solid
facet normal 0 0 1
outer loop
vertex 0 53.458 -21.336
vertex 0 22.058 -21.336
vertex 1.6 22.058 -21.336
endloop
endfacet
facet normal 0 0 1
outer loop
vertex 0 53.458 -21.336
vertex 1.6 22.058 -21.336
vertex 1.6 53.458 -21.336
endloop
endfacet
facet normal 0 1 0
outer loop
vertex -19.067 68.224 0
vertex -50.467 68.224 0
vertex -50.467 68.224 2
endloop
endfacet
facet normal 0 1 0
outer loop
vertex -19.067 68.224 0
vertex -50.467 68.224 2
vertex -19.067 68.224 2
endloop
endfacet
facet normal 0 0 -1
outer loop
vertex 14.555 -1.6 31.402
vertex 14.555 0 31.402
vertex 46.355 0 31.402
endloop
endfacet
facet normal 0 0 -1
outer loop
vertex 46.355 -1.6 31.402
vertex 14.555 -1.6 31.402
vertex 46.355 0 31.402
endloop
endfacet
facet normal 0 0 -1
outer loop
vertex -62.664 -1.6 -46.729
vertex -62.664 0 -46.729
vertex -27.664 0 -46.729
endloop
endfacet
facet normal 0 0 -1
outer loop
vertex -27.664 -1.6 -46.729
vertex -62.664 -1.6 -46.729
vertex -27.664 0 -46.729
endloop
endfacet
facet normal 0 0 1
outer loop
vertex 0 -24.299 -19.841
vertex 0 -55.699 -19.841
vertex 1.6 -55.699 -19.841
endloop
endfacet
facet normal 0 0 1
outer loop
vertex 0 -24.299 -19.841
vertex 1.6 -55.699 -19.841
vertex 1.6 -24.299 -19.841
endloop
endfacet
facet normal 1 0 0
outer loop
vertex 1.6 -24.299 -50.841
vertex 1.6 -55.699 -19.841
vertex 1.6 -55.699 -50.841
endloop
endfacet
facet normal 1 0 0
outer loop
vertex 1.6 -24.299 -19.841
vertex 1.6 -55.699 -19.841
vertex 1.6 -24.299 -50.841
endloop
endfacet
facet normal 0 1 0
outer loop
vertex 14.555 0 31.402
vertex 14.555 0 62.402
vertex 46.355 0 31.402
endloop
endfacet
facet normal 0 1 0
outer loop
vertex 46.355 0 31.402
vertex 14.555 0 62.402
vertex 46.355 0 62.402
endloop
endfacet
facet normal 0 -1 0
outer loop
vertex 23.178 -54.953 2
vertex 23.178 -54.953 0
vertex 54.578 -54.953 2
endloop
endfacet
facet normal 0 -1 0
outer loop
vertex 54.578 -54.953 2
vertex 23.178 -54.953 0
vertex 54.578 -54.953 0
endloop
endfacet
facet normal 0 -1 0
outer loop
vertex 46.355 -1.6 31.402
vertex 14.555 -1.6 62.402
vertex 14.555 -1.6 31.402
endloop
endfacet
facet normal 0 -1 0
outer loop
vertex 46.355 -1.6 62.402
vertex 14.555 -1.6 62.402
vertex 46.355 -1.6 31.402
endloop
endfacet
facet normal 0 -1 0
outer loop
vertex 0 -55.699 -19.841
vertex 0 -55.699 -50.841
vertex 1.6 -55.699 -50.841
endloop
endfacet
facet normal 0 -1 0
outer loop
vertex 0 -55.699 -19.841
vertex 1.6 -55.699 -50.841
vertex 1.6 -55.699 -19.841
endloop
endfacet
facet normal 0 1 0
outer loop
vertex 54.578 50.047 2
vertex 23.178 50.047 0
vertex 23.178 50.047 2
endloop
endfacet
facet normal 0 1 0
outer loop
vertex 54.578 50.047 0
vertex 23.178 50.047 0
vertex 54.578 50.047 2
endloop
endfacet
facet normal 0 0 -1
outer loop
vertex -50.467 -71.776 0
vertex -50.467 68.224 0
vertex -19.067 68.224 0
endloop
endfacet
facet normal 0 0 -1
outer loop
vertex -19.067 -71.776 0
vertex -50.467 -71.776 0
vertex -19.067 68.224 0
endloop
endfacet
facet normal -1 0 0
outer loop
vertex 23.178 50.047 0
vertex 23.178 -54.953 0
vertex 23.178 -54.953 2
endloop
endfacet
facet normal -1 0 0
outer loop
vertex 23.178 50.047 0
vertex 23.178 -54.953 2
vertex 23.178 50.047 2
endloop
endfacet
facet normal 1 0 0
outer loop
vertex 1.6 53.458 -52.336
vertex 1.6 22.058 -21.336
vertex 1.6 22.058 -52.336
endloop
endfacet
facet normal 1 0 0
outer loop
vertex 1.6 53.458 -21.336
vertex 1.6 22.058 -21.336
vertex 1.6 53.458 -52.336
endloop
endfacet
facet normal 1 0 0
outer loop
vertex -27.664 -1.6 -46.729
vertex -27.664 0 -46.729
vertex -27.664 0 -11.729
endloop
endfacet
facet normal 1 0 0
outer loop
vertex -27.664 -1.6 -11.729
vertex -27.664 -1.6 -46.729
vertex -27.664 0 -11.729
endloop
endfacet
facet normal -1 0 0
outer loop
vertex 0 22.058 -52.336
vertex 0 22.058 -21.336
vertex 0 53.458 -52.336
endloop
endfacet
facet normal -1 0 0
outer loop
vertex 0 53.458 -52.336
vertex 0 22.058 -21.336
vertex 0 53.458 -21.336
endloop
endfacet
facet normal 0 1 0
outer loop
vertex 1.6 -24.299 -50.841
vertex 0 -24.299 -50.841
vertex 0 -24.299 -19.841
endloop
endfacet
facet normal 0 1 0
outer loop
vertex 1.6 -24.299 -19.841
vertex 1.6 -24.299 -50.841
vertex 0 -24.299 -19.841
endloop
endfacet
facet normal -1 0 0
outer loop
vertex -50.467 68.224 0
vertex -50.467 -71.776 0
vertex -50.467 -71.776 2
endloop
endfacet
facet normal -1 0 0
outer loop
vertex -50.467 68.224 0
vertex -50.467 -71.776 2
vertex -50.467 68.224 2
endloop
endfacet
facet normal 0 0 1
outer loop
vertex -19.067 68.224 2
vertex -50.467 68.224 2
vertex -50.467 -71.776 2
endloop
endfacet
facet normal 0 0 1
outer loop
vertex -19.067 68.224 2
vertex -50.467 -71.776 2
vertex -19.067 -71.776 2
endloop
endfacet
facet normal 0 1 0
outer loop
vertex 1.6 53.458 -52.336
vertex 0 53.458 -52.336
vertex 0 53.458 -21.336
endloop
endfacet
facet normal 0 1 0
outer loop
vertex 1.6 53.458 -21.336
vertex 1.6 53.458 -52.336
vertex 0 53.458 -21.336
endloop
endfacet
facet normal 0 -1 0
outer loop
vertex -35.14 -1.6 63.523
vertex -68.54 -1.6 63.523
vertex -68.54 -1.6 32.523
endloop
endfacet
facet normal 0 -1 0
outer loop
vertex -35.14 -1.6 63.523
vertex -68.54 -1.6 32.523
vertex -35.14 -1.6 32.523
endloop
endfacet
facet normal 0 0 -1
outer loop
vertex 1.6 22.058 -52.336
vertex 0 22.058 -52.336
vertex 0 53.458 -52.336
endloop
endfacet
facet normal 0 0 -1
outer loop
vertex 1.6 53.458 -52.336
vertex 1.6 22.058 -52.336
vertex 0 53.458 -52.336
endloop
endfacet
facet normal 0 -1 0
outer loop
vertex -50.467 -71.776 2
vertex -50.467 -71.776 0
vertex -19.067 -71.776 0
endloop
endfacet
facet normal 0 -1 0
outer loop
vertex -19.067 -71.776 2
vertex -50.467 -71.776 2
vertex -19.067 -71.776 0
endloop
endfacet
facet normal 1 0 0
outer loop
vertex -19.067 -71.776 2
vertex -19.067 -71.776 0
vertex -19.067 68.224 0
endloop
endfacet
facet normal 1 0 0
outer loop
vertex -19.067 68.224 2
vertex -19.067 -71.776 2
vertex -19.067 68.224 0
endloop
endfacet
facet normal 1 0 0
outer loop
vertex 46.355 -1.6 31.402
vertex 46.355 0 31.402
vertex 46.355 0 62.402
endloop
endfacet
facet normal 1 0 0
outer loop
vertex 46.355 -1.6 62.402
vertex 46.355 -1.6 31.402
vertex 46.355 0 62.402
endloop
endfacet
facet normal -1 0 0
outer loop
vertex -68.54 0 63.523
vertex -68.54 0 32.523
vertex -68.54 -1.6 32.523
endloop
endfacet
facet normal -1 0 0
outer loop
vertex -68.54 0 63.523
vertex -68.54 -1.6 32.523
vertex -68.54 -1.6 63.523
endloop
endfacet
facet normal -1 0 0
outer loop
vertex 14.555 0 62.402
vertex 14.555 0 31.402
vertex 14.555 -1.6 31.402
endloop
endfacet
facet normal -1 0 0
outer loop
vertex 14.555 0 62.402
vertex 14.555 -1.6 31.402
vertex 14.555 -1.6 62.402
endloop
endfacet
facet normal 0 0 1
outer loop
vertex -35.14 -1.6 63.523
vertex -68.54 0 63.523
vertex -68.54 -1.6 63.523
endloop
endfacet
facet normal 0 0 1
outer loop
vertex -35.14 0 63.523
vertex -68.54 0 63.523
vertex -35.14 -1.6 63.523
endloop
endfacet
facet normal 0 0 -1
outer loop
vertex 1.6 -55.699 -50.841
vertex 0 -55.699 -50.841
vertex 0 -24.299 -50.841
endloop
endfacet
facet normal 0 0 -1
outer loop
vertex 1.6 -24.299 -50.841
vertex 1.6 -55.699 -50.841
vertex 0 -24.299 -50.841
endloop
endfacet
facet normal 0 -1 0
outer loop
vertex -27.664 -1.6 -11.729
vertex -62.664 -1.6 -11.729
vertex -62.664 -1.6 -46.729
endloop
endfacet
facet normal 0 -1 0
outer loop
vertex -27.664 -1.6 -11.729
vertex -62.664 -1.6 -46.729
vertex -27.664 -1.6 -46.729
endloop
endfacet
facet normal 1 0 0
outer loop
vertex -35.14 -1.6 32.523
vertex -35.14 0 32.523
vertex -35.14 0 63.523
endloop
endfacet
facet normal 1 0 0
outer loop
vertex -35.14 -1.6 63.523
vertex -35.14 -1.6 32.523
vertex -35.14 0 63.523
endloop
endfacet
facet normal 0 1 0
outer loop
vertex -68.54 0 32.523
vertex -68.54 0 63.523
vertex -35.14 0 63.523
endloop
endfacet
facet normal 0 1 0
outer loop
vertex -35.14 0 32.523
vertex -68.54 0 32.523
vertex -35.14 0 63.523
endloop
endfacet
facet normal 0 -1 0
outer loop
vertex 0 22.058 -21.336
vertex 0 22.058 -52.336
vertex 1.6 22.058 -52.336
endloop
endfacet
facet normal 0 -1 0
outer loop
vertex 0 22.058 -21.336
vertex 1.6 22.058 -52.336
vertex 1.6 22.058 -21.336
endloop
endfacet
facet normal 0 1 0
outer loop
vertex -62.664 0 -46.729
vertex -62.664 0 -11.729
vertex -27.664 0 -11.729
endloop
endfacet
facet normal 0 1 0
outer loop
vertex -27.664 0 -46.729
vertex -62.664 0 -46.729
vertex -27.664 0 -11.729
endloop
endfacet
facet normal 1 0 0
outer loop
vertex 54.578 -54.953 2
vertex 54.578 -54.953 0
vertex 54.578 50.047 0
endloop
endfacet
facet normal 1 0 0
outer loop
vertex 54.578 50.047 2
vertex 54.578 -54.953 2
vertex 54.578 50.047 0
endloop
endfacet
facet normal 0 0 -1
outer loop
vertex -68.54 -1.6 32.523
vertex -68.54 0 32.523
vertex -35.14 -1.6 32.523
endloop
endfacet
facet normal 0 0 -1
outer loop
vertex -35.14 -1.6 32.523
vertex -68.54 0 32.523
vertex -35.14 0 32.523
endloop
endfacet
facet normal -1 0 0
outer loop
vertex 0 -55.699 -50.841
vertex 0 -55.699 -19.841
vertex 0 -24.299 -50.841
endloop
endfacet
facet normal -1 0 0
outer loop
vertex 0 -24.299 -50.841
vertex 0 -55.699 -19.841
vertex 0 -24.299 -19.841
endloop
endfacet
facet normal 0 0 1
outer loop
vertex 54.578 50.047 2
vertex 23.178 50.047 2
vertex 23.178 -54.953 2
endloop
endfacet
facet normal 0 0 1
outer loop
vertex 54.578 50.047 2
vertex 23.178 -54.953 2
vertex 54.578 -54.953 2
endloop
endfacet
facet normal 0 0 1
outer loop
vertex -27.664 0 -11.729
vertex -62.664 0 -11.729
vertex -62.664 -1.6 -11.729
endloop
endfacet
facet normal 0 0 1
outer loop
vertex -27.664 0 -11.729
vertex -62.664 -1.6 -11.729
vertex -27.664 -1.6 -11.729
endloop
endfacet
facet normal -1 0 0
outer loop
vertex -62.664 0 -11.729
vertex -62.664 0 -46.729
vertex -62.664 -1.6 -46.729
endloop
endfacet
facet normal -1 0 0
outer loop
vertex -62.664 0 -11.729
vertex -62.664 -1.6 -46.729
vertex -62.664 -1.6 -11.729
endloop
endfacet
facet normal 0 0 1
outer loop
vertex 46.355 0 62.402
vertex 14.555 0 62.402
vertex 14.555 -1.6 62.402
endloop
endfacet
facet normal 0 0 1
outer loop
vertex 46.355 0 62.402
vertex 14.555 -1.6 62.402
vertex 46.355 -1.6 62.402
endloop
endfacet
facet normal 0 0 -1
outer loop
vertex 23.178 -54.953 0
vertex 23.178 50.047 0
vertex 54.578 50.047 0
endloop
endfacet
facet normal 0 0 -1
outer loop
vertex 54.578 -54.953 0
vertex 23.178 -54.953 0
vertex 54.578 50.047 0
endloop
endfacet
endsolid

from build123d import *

# Parameters (mm, degrees)
F0_W      = 31.4
F0_H      = 105
F1_DEPTH  = 2
F2_W      = 31.4
F2_H      = 140
F3_DEPTH  = 2
F4_W      = 33.4
F4_H      = 31
F5_DEPTH  = 1.6
F6_W      = 31.8
F6_H      = 31
F7_DEPTH  = 1.6
F8_W      = 31.4
F8_H      = 31
F10_DEPTH = 1.6
F9_W      = 31.4
F9_H      = 31
F11_DEPTH = 1.6
F12_W     = 35
F12_H     = 35
F13_DEPTH = 1.6


with BuildPart() as f1:
    # F0 (on Top) → F1 (new body)
    with BuildSketch(Plane.XY):
        with Locations((38.877585, -2.453307)):
            Rectangle(F0_W, F0_H)
    extrude(amount=F1_DEPTH)


with BuildPart() as f3:
    # F2 (on Top) → F3 (new body)
    with BuildSketch(Plane.XY):
        with Locations((-34.767331, -1.775749)):
            Rectangle(F2_W, F2_H)
    extrude(amount=F3_DEPTH)


with BuildPart() as f5:
    # F4 (on Front) → F5 (new body)
    with BuildSketch(Plane.XZ):
        with Locations((-51.840209, 48.02339)):
            Rectangle(F4_W, F4_H)
    extrude(amount=F5_DEPTH)


with BuildPart() as f7:
    # F6 (on Front) → F7 (new body)
    with BuildSketch(Plane.XZ):
        with Locations((30.455169, 46.901891)):
            Rectangle(F6_W, F6_H)
    extrude(amount=F7_DEPTH)


with BuildPart() as f10:
    # F8 (on Right) → F10 (new body)
    with BuildSketch(Plane.YZ):
        with Locations((-39.999083, -35.341156)):
            Rectangle(F8_W, F8_H)
    extrude(amount=F10_DEPTH)


with BuildPart() as f11:
    # F9 (on Right) → F11 (new body)
    with BuildSketch(Plane.YZ):
        with Locations((37.757983, -36.83648)):
            Rectangle(F9_W, F9_H)
    extrude(amount=F11_DEPTH)


with BuildPart() as f13:
    # F12 (on Front) → F13 (new body)
    with BuildSketch(Plane.XZ):
        with Locations((-45.16357, -29.229002)):
            Rectangle(F12_W, F12_H)
    extrude(amount=F13_DEPTH)


solid = Compound([f1.part, f3.part, f5.part, f7.part, f10.part, f11.part, f13.part])
